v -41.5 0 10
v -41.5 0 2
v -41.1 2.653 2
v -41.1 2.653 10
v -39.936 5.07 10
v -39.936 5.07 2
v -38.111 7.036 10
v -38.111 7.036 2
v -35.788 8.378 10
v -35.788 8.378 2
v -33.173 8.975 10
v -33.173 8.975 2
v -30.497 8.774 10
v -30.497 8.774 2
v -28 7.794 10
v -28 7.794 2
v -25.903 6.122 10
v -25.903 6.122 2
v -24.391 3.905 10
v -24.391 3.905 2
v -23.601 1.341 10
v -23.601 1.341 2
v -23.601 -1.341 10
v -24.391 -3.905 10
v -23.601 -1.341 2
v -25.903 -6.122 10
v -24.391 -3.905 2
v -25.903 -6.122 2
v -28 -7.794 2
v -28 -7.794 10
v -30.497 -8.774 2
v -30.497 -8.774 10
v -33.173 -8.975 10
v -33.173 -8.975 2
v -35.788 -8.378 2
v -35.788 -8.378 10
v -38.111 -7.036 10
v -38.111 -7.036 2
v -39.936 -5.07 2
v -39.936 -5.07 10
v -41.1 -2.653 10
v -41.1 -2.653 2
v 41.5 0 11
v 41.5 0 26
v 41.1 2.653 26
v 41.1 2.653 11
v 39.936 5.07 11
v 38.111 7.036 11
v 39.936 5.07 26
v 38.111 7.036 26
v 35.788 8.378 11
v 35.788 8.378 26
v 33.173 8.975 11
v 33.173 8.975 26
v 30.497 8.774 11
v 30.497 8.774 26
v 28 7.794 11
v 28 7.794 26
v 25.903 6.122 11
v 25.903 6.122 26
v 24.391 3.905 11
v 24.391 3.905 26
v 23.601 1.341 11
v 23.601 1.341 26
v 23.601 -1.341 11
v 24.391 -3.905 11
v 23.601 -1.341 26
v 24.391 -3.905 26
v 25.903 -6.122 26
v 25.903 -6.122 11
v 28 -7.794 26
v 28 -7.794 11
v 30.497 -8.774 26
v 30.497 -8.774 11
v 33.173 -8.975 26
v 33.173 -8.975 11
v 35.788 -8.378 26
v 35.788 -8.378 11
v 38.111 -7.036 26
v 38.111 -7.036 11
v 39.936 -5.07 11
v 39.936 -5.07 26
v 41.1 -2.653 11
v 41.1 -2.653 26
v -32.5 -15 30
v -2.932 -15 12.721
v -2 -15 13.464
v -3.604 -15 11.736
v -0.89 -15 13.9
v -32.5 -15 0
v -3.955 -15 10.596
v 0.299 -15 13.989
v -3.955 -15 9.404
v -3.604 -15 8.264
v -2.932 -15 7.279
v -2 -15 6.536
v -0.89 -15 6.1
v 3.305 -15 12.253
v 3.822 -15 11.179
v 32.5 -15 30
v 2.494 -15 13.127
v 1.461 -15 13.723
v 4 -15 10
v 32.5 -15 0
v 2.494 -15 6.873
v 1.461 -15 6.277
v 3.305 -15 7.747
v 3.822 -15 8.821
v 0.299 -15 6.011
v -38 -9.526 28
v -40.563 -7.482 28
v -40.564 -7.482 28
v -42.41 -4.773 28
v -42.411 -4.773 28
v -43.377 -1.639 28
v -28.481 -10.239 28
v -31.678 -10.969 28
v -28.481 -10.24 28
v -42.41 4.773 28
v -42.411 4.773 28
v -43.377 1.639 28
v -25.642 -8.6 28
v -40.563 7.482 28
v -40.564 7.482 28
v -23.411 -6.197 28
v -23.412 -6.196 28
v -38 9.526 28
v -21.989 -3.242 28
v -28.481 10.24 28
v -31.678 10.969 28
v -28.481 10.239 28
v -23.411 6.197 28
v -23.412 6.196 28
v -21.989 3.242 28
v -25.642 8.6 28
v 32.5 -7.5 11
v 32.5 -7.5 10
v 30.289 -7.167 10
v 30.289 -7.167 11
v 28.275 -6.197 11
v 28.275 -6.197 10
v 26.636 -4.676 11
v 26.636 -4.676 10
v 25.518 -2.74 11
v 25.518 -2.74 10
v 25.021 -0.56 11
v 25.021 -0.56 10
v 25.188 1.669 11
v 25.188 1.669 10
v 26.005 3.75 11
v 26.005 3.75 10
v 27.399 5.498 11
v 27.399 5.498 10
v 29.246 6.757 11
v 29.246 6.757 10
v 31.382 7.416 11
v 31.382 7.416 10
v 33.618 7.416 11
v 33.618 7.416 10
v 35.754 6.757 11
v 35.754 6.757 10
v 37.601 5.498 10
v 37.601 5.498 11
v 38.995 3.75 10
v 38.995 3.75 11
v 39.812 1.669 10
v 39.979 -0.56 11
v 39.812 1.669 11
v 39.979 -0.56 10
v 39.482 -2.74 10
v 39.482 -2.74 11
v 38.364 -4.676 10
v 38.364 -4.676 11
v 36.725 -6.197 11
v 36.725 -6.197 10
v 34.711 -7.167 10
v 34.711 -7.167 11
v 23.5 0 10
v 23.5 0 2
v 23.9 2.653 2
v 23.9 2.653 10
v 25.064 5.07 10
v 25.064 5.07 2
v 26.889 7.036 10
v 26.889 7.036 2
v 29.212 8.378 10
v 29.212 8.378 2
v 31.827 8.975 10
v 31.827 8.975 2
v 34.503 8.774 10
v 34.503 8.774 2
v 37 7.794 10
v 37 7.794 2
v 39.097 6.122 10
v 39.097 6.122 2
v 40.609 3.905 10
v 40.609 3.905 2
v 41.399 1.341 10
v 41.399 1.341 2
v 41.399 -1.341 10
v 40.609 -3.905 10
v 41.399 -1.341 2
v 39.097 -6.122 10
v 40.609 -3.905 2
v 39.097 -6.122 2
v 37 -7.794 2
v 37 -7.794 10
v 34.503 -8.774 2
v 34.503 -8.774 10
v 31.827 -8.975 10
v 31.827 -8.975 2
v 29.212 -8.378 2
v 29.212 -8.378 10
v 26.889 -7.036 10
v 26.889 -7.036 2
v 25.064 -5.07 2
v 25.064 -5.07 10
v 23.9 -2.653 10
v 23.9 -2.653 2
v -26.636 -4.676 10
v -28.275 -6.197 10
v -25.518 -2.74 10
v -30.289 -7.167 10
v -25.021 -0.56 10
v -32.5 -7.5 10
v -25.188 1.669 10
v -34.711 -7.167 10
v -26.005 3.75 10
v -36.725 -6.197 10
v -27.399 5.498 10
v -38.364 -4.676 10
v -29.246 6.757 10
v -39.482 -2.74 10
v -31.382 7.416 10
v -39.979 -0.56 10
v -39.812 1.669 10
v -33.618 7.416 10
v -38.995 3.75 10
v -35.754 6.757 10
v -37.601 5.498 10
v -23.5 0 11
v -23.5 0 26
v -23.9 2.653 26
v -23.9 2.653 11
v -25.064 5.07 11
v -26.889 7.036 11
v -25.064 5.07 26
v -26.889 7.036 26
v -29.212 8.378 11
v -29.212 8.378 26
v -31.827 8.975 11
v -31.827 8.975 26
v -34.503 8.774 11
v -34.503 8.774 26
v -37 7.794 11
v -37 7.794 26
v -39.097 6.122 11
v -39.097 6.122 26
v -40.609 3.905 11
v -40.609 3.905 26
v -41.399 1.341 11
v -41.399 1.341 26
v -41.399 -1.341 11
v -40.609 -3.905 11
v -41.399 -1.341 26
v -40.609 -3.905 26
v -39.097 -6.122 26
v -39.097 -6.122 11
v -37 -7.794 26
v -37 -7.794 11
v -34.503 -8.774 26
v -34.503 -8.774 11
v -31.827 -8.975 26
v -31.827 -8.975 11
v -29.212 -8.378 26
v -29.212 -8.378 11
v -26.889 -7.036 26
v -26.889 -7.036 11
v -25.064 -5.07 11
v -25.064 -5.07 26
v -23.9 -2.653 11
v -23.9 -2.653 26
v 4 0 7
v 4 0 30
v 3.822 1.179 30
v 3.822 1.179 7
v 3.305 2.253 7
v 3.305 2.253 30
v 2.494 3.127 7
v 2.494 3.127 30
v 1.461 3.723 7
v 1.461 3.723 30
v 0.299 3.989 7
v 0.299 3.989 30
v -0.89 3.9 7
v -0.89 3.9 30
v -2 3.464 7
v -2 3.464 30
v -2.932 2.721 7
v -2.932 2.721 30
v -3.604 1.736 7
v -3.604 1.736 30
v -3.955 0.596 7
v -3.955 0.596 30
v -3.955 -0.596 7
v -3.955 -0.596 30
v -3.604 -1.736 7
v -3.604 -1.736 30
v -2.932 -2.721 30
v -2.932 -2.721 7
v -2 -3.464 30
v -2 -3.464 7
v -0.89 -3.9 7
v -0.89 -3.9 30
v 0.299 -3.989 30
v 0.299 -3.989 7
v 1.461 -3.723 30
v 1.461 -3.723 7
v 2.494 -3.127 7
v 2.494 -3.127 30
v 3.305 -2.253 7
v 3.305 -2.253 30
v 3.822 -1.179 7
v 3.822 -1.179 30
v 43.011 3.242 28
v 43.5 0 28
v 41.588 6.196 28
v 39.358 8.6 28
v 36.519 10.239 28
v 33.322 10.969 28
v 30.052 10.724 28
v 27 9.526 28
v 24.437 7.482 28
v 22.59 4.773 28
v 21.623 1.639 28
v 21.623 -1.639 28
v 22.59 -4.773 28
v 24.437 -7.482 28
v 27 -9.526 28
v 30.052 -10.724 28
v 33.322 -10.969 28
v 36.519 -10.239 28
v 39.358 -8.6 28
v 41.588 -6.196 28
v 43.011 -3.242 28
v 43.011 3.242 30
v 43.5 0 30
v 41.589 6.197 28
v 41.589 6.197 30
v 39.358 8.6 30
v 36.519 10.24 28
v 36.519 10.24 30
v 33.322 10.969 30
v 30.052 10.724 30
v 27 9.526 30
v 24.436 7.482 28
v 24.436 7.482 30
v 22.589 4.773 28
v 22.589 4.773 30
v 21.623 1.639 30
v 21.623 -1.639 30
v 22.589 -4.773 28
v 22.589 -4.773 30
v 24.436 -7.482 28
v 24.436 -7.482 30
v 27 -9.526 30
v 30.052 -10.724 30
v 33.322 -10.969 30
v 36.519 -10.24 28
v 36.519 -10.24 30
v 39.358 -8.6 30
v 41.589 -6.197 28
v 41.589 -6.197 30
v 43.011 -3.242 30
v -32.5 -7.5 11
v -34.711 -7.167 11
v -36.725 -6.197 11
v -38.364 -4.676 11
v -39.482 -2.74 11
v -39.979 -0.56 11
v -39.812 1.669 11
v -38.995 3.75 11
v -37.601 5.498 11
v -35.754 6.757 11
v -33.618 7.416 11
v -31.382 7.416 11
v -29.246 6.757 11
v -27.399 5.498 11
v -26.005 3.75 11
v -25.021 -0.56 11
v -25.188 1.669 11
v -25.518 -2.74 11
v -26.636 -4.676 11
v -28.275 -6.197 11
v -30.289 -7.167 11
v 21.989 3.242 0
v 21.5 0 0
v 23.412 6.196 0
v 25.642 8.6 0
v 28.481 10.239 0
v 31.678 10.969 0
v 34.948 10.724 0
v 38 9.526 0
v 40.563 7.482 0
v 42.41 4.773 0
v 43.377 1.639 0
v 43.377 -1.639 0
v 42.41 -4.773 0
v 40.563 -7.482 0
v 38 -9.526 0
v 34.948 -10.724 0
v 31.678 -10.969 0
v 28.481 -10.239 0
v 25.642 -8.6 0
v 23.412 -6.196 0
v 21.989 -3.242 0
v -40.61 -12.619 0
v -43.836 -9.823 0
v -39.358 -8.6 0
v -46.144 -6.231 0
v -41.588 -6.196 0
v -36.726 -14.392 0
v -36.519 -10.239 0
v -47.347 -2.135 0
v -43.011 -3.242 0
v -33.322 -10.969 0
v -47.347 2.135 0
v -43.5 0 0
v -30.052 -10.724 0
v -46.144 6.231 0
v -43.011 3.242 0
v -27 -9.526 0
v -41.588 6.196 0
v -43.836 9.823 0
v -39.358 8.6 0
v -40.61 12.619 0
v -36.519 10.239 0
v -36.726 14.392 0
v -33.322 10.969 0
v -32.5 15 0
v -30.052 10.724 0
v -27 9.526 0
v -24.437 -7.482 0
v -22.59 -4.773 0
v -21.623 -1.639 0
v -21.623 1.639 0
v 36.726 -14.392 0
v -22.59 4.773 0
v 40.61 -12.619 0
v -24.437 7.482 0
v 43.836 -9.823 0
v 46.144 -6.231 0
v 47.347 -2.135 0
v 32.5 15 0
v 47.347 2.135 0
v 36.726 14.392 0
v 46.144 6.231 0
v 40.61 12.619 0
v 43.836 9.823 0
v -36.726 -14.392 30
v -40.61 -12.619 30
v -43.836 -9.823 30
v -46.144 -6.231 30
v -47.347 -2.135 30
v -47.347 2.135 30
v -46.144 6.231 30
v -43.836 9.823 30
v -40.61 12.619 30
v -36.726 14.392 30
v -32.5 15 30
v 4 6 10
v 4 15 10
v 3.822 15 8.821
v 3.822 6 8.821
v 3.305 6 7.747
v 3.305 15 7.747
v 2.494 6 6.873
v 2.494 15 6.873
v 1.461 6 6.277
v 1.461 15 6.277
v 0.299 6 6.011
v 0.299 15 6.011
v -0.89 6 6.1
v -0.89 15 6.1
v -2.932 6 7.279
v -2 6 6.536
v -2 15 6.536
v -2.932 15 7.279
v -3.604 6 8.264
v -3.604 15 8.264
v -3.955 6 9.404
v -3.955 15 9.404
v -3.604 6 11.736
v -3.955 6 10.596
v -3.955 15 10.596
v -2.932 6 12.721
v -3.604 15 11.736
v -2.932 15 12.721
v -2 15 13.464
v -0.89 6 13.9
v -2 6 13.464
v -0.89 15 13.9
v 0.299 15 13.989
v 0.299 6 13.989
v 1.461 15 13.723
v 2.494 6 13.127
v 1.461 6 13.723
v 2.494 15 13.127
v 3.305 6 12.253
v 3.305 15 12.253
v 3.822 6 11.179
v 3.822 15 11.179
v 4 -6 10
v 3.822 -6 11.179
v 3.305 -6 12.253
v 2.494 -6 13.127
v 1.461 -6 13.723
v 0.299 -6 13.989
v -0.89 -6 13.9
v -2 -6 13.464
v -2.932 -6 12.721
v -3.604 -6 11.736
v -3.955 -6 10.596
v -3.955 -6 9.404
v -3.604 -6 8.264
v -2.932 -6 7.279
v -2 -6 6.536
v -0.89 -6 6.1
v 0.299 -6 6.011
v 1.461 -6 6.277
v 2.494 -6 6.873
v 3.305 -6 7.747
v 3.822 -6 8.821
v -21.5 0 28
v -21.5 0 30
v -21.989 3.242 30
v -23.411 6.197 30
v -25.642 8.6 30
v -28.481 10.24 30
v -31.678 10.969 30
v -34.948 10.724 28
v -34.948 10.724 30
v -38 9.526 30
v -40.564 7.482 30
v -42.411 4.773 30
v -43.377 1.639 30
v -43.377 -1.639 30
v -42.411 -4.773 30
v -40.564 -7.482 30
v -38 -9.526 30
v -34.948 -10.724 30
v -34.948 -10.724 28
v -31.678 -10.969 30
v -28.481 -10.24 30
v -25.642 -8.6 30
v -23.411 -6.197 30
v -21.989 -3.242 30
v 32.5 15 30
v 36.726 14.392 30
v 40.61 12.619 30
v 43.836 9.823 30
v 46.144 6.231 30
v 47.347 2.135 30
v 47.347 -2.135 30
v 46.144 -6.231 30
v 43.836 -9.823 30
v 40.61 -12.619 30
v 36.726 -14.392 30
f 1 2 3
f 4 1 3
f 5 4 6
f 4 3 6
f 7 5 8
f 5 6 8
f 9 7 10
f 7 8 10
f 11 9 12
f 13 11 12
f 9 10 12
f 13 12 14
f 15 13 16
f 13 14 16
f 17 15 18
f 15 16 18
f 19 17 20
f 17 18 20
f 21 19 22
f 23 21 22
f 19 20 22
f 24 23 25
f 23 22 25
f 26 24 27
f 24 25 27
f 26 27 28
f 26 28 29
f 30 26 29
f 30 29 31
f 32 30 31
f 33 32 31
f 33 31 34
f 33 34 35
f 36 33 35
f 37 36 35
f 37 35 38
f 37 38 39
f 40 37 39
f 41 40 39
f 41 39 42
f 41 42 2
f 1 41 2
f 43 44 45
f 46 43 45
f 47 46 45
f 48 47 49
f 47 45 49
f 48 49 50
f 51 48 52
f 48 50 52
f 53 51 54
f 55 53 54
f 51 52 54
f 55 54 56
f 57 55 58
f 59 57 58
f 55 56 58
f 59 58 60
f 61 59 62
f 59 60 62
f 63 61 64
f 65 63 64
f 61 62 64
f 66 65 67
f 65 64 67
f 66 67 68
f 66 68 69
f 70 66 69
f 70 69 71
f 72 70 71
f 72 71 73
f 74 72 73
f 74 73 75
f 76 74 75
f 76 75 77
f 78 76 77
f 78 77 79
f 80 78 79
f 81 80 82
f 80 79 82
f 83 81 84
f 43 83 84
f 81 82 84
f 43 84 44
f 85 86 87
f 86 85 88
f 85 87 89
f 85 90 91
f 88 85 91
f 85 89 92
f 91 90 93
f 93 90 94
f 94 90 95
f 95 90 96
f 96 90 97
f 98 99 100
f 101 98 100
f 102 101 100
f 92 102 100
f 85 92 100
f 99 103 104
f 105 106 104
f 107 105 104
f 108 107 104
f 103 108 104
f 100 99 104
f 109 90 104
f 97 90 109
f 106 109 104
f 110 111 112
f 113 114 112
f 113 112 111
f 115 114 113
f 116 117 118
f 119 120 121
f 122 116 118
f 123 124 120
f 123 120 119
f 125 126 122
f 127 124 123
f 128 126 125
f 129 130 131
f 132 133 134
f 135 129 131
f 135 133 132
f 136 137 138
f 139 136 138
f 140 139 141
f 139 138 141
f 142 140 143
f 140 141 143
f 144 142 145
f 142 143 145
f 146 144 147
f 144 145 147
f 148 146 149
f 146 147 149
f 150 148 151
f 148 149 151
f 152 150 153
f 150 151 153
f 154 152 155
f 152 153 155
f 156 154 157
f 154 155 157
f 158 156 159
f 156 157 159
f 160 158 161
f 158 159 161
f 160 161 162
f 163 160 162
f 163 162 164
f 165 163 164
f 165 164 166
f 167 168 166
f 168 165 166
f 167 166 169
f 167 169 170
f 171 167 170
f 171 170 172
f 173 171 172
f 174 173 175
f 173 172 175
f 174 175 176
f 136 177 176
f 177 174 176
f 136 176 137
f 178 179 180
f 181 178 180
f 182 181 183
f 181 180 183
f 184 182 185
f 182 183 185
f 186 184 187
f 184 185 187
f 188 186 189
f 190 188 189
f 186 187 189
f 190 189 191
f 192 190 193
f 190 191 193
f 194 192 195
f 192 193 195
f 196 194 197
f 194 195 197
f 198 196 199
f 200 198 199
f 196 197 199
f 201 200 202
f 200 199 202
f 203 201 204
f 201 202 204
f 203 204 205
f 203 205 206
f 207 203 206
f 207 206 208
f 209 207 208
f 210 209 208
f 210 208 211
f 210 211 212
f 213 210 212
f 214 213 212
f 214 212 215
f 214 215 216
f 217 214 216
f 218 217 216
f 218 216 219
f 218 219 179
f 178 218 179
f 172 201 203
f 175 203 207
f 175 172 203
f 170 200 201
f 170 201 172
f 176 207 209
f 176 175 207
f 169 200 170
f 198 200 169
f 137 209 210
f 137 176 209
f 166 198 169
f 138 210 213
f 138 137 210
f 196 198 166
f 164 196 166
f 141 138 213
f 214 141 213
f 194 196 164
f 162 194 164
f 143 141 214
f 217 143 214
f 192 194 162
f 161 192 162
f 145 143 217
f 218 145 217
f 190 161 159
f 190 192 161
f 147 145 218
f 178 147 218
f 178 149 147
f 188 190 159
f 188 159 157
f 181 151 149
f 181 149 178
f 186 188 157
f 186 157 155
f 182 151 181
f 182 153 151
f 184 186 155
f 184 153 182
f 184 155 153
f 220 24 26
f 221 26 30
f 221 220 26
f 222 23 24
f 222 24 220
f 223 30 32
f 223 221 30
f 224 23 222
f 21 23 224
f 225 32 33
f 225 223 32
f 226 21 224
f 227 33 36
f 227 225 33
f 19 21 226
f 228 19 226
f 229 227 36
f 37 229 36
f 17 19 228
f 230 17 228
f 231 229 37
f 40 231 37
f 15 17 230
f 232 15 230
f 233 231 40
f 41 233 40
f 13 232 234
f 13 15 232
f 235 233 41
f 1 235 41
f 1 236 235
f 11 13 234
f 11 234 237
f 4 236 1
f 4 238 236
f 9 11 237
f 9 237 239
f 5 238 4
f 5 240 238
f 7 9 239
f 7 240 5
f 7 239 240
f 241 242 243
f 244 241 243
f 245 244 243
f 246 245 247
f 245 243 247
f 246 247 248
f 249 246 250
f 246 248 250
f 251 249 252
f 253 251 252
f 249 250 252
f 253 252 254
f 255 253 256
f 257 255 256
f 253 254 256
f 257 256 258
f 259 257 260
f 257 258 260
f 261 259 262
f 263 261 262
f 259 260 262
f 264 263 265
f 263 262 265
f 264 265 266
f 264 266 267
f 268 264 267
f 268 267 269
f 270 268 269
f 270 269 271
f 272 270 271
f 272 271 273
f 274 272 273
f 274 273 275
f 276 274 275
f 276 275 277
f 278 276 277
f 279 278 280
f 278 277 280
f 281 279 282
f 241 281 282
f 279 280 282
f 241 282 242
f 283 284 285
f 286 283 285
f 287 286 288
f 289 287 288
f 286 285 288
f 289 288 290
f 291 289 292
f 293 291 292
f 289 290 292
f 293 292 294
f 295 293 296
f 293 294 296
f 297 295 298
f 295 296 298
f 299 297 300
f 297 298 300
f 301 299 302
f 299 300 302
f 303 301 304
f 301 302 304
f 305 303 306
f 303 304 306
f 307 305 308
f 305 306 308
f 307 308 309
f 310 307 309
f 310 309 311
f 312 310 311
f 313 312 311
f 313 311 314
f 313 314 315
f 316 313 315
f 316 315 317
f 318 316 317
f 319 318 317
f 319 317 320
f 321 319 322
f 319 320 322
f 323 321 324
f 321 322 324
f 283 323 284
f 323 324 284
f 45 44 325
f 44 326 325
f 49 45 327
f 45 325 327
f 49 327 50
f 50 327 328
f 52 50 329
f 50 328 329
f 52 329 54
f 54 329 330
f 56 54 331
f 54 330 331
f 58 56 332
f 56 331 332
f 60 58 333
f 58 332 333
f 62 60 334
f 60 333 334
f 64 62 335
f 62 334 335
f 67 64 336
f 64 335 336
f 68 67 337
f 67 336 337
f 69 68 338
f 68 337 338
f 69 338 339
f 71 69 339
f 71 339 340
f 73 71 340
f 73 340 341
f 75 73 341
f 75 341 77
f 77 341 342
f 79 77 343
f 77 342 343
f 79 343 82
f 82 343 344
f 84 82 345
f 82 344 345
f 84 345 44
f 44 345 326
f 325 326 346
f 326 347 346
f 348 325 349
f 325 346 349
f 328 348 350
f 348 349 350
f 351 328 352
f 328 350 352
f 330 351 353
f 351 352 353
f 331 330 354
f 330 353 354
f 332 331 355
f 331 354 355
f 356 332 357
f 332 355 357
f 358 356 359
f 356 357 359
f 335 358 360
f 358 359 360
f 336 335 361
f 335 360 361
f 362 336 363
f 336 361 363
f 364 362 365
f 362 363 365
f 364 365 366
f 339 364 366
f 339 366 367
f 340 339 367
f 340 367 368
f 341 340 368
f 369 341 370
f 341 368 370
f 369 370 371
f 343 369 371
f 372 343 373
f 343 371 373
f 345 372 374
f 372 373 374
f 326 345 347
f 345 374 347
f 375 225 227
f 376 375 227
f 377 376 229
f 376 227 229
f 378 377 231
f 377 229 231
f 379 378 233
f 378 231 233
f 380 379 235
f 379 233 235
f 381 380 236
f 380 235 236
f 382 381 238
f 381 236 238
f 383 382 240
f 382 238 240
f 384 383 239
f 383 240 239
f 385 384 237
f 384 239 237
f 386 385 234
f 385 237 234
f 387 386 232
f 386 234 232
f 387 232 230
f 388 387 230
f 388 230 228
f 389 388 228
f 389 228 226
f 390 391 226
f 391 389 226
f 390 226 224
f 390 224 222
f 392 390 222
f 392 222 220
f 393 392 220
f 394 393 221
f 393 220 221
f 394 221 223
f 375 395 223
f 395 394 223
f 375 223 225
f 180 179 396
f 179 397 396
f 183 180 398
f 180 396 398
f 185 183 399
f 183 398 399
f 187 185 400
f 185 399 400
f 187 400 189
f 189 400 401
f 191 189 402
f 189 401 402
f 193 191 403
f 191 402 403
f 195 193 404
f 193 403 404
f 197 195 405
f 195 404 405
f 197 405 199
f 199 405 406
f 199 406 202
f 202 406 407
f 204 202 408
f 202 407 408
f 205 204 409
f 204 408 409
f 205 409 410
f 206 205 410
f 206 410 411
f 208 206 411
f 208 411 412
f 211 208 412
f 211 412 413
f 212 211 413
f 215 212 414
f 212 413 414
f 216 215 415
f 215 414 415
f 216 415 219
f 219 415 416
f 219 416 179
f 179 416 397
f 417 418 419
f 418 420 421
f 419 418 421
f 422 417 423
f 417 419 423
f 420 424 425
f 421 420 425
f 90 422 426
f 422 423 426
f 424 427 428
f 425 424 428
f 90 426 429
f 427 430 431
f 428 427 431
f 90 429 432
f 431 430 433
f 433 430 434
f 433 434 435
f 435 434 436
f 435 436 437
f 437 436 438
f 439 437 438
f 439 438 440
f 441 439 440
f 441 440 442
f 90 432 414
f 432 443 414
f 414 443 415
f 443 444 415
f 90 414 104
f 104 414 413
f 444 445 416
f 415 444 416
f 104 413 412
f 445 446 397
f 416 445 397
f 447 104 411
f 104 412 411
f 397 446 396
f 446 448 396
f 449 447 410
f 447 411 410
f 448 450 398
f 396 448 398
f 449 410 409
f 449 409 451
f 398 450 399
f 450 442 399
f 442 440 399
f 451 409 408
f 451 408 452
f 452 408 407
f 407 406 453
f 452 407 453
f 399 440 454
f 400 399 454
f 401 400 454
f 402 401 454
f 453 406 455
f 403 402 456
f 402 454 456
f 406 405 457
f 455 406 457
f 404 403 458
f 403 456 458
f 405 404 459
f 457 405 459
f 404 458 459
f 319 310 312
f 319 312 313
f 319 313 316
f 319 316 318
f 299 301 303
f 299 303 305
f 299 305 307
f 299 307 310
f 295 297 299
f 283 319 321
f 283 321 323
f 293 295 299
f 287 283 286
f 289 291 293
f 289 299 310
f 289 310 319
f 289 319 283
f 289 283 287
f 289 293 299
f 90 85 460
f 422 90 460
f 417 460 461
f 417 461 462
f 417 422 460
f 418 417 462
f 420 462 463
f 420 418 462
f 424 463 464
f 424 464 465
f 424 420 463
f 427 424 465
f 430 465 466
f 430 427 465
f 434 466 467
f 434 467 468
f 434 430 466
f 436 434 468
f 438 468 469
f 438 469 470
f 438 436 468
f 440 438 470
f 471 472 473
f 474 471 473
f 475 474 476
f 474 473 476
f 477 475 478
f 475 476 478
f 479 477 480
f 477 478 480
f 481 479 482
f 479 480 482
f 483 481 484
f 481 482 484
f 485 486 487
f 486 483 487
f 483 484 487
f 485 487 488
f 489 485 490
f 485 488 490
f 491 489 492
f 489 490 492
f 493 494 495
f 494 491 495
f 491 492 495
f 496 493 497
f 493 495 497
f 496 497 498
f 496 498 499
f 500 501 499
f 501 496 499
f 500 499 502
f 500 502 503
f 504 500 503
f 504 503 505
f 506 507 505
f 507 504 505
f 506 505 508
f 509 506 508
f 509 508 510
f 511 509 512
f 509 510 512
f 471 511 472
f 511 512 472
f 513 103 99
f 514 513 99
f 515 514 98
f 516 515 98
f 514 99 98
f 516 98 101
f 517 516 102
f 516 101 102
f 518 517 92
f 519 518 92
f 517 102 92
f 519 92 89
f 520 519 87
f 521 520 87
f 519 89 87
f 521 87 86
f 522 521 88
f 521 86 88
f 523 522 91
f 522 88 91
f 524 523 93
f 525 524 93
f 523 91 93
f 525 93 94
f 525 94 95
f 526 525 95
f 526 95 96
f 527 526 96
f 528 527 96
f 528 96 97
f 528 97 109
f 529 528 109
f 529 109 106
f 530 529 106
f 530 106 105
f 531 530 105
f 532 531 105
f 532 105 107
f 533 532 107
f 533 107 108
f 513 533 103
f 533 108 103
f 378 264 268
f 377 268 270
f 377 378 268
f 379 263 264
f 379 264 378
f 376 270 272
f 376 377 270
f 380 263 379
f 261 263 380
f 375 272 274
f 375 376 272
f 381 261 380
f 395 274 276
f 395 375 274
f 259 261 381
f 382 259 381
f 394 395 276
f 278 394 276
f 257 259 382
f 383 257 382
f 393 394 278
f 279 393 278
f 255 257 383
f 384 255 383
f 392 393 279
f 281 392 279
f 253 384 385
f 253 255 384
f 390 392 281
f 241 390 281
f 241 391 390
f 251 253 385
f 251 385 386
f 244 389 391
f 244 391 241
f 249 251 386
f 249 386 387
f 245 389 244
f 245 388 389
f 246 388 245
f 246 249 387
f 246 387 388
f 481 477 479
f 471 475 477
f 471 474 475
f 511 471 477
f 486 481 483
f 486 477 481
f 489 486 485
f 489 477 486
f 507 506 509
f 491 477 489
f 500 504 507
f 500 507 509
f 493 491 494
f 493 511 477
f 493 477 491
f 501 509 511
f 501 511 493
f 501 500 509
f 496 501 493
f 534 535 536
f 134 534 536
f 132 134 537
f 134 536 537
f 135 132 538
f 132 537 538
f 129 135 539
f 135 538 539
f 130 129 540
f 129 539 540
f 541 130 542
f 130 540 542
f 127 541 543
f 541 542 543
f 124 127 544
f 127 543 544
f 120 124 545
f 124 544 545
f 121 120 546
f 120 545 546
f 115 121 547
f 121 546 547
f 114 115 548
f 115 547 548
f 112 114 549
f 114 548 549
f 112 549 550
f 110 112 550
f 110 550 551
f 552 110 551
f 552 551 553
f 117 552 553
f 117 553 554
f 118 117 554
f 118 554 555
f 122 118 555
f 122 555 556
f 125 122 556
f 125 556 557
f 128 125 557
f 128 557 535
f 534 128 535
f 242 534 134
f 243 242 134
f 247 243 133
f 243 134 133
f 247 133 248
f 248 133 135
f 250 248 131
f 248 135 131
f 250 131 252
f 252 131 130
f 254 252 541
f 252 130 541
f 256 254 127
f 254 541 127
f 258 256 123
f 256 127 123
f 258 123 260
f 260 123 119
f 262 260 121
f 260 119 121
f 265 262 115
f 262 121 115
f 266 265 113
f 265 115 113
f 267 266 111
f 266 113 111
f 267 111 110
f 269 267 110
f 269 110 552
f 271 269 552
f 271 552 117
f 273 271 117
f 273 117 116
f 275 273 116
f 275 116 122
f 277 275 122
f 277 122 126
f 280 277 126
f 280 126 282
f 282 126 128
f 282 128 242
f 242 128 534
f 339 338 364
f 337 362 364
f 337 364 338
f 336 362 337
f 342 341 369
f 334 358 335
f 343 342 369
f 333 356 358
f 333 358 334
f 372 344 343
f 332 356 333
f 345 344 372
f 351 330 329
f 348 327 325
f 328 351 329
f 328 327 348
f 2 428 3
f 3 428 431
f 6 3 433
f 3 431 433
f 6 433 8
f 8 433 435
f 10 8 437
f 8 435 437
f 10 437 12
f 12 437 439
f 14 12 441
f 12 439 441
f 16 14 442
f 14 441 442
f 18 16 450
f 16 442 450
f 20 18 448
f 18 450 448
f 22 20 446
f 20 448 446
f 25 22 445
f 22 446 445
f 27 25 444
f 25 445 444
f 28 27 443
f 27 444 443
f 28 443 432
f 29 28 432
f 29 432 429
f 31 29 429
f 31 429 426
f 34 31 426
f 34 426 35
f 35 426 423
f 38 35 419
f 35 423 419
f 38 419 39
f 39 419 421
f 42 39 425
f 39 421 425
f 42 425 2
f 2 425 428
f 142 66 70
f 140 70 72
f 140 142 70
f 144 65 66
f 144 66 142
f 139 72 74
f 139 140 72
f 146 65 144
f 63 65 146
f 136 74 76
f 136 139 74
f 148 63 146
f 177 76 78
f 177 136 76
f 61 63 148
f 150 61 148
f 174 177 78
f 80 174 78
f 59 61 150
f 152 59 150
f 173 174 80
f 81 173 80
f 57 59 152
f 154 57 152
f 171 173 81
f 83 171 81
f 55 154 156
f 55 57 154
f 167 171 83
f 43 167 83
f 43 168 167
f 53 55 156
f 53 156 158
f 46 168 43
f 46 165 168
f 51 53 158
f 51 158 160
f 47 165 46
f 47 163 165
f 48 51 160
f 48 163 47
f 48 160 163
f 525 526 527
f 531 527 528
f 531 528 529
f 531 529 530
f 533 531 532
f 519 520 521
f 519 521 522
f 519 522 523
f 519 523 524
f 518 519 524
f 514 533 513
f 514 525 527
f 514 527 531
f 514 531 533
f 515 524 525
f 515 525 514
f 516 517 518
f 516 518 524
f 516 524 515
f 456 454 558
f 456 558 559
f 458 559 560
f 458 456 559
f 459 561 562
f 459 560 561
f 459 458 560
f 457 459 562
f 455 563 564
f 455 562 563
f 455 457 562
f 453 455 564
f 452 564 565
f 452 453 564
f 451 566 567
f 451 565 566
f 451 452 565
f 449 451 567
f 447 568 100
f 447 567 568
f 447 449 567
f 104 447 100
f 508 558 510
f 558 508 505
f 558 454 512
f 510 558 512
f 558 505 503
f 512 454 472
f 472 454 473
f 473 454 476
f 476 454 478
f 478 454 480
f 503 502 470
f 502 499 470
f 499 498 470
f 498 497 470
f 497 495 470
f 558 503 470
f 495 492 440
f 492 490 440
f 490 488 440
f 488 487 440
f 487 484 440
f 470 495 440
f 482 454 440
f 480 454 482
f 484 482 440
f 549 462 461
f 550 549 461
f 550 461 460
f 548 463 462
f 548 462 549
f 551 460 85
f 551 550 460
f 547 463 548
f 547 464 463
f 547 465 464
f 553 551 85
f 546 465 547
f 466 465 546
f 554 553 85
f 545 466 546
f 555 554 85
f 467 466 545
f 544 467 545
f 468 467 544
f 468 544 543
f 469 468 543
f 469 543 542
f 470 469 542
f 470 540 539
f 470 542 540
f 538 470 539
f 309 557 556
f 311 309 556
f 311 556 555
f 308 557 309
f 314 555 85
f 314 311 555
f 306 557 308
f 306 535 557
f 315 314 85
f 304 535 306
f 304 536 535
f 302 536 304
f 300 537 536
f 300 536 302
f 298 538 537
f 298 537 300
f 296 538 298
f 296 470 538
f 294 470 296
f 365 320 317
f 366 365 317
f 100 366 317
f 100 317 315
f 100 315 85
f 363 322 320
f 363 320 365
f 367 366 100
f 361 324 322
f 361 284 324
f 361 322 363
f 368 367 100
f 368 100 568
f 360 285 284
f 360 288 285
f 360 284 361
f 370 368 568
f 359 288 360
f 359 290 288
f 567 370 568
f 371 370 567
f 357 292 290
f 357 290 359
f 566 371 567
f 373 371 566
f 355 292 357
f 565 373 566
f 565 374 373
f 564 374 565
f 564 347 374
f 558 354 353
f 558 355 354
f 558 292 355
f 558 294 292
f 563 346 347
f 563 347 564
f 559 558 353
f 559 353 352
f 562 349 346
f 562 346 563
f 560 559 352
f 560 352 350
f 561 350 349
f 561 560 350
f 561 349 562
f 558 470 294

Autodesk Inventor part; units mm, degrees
ref_plane "YZ Plane" through (0, 0, 0) normal (1, 0, 0) x (0, 1, 0)
ref_plane "XZ Plane" through (0, 0, 0) normal (0, 1, 0) x (-1, 0, 0)
ref_plane "XY Plane" through (0, 0, 0) normal (0, 0, 1) x (1, 0, 0)
sketch "Náčrt1" plane through (0, 0, 0) normal (0, 0, 1) x (1, 0, 0)
  line L0 (-32.5, -15) -> (32.5, -15)
  line L1 (47.5, 0) -> (47.5, 0)
  line L2 (32.5, 15) -> (-32.5, 15)
  line L3 (-47.5, 0) -> (-47.5, 0)
  line L4 (-47.5, -15) -> (47.5, 15) construction
  line L5 (47.5, -15) -> (-47.5, 15) construction
  arc A0 (-32.5, 15) -> (-47.5, 0) centre (-32.5, 0) ccw
  arc A1 (-47.5, 0) -> (-32.5, -15) centre (-32.5, 0) ccw
  arc A2 (32.5, -15) -> (47.5, 0) centre (32.5, 0) ccw
  arc A3 (47.5, 0) -> (32.5, 15) centre (32.5, 0) ccw
  point P0 (0, 0)
  point P1 (47.5, 0)
  point P2 (-47.5, 0)
  dimension "d0" = 95
  dimension "d1" = 30
  dimension "d2" = 15
extrude "Vysunutí1" add sketch "Náčrt1" along normal blind 30
sketch "Náčrt2" plane through (0, 0, 30) normal (0, 0, 1) x (1, 0, 0)
  arc A0 (32.5, -15) -> (32.5, 15) centre (32.5, 0) ccw projected
  line L0 (32.5, 15) -> (-32.5, 15) projected
  arc A1 (-32.5, 15) -> (-32.5, -15) centre (-32.5, 0) ccw projected
  line L1 (-32.5, -15) -> (32.5, -15) projected
  point P0 (0, 0)
hole "Díra1" at (-32.5, 0, 30) at (32.5, 0, 30) direction (0, 0, -1) diameter 15 end through all
sketch "Náčrt3" plane through (0, 0, 30) normal (0, 0, 1) x (1, 0, 0)
  circle A0 centre (-32.5, 0) radius 7.5 projected
  circle A1 centre (32.5, 0) radius 7.5 projected
  circle A2 centre (-32.5, 0) radius 11
  circle A3 centre (32.5, 0) radius 11
  point P0 (0, 0)
  dimension "d14" = 22
  dimension "d15" = 22
extrude "Vysunutí2" cut sketch "Náčrt3" against normal blind 2 contours A1 | A2 | A3
sketch "Náčrt4" plane through (-32.5, 0, 28) normal (0, 0, 1) x (1, 0, 0)
  circle A0 centre (0, 0) radius 11 projected
  circle A1 centre (0, 0) radius 7.5 projected
  circle A2 centre (65, 0) radius 7.5 projected
  circle A3 centre (0, 0) radius 9
  circle A4 centre (65, 0) radius 9
  point P0 (32.5, 0)
  dimension "d18" = 18
  dimension "d19" = 18
extrude "Vysunutí3" cut sketch "Náčrt4" against normal blind 17 contours A3 | A4
sketch "Náčrt5" plane through (0, 0, 0) normal (0, 0, -1) x (-1, 0, 0)
  circle A0 centre (32.5, 0) radius 7.5 projected
  circle A1 centre (-32.5, 0) radius 7.5 projected
  circle A2 centre (32.5, 0) radius 9
  circle A3 centre (-32.5, 0) radius 9
  point P0 (0, 0)
  dimension "d22" = 18
  dimension "d23" = 18
extrude "Vysunutí4" cut sketch "Náčrt5" against normal blind 10
chamfer "Zkosení1" distance 2 angle 45 4 edges at (-23.5, 0, 0) (41.5, 0, 0) (-41.5, 0, 28) (23.5, 0, 28)
sketch "Náčrt6" plane through (0, 0, 30) normal (0, 0, 1) x (1, 0, 0)
  circle A0 centre (0, 0) radius 4
  dimension "d29" = 8
extrude "Vysunutí5" cut sketch "Náčrt6" against normal blind 23
sketch "Náčrt7" plane through (-32.5, -15, 0) normal (0, -1, 0) x (1, 0, 0)
  circle A0 centre (32.5, 10) radius 4
  line L0 (0, 30) -> (65, 30) projected
  line L1 (0, 0) -> (65, 0) projected
  point P0 (32.5, 0)
  point P1 (32.5, 0)
  dimension "d32" = 8
  dimension "d33" = 20
extrude "Vysunutí6" cut sketch "Náčrt7" against normal blind 9
mirror "Zrcadlit1" about plane through (0, 0, 0) normal (0, 1, 0) of "Vysunutí6"
properties part number "P2 lmao fila" material "Ocel"
